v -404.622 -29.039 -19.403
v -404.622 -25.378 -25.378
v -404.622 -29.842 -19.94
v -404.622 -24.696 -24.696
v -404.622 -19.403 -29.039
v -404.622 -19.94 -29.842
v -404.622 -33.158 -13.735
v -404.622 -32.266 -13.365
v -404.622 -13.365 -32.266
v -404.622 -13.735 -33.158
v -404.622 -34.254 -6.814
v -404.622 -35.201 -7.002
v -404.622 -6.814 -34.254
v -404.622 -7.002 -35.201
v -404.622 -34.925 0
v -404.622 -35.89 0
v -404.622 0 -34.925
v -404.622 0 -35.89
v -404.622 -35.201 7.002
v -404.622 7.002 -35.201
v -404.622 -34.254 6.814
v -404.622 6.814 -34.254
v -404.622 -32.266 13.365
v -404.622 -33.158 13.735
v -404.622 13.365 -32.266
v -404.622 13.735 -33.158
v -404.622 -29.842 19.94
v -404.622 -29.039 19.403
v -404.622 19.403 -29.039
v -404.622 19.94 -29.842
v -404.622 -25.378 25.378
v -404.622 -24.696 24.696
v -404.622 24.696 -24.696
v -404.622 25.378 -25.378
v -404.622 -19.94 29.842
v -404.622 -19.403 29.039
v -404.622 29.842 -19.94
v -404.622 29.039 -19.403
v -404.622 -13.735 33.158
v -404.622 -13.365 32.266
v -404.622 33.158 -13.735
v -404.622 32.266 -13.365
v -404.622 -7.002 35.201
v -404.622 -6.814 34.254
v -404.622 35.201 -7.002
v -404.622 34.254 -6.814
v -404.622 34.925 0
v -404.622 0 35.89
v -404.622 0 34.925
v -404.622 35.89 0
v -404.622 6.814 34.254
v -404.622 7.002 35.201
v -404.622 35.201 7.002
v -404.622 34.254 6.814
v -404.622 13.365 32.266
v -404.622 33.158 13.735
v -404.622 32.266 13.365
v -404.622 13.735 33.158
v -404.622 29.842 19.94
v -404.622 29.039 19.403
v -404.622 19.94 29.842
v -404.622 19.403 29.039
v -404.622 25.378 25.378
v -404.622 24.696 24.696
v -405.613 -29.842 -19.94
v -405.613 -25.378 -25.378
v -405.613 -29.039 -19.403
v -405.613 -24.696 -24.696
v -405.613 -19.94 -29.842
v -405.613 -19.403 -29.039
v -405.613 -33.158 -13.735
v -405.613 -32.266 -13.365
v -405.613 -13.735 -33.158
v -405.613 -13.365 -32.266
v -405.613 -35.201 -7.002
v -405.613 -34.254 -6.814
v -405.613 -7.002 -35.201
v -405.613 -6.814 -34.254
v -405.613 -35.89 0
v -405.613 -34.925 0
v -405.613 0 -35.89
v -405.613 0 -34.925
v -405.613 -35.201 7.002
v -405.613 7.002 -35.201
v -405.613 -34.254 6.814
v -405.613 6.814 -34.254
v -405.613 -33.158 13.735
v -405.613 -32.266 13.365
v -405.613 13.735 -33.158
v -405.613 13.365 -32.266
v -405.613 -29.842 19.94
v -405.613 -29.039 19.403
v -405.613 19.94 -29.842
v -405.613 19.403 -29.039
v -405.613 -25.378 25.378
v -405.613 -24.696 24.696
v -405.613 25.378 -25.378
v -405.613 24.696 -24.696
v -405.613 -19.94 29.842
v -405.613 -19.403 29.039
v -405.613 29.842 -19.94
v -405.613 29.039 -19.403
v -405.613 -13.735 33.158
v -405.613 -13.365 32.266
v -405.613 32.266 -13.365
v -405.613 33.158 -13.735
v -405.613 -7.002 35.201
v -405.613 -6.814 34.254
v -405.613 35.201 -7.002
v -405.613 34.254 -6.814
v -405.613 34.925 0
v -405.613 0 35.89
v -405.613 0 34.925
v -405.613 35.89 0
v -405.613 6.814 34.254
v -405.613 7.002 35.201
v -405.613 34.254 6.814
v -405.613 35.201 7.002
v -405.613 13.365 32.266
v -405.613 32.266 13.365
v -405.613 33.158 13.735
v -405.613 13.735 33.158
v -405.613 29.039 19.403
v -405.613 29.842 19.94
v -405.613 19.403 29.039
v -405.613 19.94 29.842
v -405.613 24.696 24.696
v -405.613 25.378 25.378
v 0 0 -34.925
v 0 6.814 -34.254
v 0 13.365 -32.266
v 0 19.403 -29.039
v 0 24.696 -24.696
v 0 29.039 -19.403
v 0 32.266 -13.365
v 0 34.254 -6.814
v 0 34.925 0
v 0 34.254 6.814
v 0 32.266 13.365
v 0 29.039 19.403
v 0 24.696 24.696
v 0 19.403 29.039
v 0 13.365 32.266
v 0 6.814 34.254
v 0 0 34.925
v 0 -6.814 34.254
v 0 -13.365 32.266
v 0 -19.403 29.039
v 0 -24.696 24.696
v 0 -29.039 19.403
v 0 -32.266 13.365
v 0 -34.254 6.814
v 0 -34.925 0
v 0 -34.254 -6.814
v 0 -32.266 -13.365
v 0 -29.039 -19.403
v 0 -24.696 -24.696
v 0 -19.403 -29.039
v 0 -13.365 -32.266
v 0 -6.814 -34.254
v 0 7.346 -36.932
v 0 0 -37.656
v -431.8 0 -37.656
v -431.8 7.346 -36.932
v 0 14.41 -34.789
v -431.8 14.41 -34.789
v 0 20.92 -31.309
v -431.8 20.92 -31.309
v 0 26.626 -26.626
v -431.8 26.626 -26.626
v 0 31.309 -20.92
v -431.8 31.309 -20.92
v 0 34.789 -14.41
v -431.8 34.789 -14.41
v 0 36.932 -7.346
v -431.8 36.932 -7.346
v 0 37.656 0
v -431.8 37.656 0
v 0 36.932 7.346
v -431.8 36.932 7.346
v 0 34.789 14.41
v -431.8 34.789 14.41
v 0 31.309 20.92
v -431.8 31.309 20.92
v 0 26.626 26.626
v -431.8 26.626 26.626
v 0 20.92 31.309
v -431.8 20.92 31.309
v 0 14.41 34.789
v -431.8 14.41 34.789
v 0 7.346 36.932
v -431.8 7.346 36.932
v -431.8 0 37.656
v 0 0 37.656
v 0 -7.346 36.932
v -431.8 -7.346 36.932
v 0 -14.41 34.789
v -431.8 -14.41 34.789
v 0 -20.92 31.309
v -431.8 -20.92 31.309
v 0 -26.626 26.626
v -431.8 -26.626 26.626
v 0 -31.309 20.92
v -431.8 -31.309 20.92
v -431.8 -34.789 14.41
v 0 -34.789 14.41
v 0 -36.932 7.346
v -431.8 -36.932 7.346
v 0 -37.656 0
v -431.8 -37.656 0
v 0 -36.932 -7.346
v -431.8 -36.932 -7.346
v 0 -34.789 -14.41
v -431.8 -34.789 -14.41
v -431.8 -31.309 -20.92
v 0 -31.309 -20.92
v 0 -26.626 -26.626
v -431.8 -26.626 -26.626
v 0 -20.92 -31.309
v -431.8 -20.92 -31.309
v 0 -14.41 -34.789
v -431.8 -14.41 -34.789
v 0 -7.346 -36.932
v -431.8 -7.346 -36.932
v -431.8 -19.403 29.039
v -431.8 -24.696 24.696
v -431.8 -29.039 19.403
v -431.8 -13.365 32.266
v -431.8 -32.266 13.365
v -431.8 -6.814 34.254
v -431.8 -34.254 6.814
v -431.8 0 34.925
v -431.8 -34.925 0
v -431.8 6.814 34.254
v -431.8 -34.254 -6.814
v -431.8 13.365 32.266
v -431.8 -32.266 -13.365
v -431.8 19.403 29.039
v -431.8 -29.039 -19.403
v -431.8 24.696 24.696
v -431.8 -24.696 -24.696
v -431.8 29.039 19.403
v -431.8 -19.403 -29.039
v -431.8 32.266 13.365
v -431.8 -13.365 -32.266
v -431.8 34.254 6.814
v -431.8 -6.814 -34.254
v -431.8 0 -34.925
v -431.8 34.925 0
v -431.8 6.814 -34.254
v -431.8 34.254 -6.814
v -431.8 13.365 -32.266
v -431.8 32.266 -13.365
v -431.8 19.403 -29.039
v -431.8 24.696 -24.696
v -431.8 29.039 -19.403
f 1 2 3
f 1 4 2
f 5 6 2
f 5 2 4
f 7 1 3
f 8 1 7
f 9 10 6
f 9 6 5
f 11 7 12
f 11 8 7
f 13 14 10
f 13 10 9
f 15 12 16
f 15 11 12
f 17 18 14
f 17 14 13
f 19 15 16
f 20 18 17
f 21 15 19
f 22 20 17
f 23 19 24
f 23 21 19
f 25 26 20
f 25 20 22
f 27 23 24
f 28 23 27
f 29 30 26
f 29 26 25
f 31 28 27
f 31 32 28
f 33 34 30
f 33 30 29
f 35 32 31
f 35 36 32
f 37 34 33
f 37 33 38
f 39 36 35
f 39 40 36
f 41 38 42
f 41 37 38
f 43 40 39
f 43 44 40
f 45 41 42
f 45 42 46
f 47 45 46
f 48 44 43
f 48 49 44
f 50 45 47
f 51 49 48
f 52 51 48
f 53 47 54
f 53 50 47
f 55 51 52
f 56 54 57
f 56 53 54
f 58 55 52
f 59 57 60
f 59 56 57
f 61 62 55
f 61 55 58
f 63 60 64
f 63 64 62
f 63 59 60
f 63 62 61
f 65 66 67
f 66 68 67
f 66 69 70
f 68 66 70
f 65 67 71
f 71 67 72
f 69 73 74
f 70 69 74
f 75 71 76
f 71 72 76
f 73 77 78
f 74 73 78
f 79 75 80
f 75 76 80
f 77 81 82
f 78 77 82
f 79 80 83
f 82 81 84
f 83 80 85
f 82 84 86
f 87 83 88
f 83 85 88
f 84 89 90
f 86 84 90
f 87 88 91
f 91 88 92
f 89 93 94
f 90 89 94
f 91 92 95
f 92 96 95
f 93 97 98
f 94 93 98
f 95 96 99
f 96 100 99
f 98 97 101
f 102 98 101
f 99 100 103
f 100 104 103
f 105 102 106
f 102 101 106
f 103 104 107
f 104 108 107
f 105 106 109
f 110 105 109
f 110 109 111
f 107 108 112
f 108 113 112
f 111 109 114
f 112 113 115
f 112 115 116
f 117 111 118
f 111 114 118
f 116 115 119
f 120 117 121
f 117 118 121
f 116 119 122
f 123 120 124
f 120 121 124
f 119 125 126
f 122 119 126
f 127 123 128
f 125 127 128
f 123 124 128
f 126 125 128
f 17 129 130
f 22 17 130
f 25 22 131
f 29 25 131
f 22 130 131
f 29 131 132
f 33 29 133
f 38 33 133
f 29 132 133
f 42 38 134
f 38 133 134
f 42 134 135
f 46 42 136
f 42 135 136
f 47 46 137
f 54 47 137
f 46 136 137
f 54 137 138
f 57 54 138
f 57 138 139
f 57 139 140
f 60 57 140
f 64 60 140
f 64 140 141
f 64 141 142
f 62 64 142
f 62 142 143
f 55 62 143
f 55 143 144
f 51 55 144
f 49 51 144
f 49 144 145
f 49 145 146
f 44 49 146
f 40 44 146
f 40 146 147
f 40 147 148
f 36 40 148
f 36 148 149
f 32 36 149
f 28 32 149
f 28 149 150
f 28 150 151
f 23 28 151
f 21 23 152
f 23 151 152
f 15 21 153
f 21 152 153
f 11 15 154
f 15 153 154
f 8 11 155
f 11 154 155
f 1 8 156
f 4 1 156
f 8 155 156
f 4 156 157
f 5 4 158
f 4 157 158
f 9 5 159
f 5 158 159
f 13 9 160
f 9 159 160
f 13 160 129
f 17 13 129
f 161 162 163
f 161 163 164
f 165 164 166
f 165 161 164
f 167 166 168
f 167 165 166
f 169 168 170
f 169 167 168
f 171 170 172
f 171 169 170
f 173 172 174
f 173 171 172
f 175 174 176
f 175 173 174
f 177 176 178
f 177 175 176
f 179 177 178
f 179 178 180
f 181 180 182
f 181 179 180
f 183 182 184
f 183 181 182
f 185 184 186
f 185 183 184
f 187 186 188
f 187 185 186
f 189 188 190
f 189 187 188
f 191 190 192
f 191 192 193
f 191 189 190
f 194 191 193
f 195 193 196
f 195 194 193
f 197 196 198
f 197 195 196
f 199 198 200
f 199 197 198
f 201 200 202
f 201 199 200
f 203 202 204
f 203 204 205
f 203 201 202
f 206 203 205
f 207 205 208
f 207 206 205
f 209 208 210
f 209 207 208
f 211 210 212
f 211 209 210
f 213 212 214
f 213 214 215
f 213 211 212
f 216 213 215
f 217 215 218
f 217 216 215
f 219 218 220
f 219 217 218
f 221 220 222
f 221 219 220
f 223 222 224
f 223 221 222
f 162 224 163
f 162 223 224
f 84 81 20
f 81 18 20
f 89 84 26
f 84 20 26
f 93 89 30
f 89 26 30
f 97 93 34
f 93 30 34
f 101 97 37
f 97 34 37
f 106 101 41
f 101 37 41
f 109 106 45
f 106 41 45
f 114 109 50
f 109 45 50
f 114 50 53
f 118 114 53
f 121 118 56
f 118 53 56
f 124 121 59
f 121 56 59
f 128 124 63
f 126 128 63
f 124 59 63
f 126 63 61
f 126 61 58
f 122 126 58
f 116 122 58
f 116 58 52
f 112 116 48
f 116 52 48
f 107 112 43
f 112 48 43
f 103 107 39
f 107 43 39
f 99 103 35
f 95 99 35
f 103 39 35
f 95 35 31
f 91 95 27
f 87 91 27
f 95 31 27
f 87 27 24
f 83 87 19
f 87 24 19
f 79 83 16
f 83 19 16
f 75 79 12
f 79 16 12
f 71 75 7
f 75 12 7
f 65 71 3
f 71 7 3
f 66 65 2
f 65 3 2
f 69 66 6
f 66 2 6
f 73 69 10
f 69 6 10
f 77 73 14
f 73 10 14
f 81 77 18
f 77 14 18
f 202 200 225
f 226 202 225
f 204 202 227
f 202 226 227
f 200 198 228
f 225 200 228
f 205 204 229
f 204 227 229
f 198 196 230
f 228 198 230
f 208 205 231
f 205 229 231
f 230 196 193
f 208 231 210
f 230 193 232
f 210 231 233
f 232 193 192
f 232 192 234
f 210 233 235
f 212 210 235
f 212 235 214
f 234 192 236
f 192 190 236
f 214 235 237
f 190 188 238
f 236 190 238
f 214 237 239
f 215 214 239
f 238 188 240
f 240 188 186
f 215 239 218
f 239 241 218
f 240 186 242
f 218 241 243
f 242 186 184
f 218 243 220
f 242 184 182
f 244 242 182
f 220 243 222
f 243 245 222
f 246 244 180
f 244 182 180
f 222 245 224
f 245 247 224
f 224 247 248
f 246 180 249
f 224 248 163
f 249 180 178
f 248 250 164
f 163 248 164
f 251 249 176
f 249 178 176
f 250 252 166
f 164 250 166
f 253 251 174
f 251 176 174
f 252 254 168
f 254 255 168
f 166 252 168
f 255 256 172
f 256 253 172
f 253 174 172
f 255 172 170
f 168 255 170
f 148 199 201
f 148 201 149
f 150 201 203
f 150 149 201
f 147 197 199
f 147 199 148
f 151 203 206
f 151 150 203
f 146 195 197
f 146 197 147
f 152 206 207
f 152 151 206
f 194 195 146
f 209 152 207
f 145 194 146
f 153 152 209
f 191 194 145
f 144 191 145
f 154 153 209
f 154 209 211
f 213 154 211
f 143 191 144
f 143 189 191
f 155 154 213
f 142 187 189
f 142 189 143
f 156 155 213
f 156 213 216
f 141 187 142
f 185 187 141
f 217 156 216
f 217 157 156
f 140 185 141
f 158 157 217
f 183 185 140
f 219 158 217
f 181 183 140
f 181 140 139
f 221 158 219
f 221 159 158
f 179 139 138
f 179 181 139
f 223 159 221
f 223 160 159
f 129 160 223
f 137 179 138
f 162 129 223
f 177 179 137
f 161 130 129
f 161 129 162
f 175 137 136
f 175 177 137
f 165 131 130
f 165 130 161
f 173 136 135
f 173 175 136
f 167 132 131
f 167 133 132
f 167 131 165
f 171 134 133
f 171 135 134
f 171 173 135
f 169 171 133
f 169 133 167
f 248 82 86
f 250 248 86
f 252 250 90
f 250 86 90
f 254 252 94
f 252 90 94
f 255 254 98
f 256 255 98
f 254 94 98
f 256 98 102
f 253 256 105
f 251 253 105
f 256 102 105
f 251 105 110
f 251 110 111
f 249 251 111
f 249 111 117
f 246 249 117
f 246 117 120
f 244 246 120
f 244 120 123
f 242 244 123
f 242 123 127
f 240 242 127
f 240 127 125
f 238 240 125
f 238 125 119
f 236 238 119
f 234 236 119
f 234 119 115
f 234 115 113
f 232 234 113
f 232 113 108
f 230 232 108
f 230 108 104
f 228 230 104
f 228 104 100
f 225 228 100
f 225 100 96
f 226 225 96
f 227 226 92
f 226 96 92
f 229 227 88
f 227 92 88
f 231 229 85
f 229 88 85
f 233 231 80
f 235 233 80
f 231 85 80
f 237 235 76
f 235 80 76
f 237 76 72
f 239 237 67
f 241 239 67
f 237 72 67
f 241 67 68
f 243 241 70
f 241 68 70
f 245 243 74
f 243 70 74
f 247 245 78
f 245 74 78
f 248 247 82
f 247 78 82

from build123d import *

# Parameters (mm, degrees)
SKETCH1_R           = 37.6555
SKETCH1_R_2         = 34.925
BOSS_EXTRUDE1_DEPTH = 431.8
SKETCH3_W           = 0.9906
SKETCH3_H           = 0.9652


with BuildPart() as part:
    # Sketch1 → Boss-Extrude1 (new body)
    with BuildSketch(Plane(origin=(0, 0, 0), x_dir=(0, 0, -1), z_dir=(1, 0, 0))):
        Circle(SKETCH1_R)
        Circle(SKETCH1_R_2, mode=Mode.SUBTRACT)
    extrude(amount=-BOSS_EXTRUDE1_DEPTH)

    # Sketch3 → Z-92479A230 Snap Ring Groove (revolve, cut)
    with BuildSketch(Plane.XY, mode=Mode.PRIVATE) as z_92479a230_snap_ring_groove_sk:
        with Locations((-405.1173, 35.4076)):
            Rectangle(SKETCH3_W, SKETCH3_H)
    revolve(z_92479a230_snap_ring_groove_sk.sketch.rotate(Axis((-431.8, 0, 0), (1, 0, 0)), 270), axis=Axis((-431.8, 0, 0), (1, 0, 0)), mode=Mode.SUBTRACT)


solid = part.part
